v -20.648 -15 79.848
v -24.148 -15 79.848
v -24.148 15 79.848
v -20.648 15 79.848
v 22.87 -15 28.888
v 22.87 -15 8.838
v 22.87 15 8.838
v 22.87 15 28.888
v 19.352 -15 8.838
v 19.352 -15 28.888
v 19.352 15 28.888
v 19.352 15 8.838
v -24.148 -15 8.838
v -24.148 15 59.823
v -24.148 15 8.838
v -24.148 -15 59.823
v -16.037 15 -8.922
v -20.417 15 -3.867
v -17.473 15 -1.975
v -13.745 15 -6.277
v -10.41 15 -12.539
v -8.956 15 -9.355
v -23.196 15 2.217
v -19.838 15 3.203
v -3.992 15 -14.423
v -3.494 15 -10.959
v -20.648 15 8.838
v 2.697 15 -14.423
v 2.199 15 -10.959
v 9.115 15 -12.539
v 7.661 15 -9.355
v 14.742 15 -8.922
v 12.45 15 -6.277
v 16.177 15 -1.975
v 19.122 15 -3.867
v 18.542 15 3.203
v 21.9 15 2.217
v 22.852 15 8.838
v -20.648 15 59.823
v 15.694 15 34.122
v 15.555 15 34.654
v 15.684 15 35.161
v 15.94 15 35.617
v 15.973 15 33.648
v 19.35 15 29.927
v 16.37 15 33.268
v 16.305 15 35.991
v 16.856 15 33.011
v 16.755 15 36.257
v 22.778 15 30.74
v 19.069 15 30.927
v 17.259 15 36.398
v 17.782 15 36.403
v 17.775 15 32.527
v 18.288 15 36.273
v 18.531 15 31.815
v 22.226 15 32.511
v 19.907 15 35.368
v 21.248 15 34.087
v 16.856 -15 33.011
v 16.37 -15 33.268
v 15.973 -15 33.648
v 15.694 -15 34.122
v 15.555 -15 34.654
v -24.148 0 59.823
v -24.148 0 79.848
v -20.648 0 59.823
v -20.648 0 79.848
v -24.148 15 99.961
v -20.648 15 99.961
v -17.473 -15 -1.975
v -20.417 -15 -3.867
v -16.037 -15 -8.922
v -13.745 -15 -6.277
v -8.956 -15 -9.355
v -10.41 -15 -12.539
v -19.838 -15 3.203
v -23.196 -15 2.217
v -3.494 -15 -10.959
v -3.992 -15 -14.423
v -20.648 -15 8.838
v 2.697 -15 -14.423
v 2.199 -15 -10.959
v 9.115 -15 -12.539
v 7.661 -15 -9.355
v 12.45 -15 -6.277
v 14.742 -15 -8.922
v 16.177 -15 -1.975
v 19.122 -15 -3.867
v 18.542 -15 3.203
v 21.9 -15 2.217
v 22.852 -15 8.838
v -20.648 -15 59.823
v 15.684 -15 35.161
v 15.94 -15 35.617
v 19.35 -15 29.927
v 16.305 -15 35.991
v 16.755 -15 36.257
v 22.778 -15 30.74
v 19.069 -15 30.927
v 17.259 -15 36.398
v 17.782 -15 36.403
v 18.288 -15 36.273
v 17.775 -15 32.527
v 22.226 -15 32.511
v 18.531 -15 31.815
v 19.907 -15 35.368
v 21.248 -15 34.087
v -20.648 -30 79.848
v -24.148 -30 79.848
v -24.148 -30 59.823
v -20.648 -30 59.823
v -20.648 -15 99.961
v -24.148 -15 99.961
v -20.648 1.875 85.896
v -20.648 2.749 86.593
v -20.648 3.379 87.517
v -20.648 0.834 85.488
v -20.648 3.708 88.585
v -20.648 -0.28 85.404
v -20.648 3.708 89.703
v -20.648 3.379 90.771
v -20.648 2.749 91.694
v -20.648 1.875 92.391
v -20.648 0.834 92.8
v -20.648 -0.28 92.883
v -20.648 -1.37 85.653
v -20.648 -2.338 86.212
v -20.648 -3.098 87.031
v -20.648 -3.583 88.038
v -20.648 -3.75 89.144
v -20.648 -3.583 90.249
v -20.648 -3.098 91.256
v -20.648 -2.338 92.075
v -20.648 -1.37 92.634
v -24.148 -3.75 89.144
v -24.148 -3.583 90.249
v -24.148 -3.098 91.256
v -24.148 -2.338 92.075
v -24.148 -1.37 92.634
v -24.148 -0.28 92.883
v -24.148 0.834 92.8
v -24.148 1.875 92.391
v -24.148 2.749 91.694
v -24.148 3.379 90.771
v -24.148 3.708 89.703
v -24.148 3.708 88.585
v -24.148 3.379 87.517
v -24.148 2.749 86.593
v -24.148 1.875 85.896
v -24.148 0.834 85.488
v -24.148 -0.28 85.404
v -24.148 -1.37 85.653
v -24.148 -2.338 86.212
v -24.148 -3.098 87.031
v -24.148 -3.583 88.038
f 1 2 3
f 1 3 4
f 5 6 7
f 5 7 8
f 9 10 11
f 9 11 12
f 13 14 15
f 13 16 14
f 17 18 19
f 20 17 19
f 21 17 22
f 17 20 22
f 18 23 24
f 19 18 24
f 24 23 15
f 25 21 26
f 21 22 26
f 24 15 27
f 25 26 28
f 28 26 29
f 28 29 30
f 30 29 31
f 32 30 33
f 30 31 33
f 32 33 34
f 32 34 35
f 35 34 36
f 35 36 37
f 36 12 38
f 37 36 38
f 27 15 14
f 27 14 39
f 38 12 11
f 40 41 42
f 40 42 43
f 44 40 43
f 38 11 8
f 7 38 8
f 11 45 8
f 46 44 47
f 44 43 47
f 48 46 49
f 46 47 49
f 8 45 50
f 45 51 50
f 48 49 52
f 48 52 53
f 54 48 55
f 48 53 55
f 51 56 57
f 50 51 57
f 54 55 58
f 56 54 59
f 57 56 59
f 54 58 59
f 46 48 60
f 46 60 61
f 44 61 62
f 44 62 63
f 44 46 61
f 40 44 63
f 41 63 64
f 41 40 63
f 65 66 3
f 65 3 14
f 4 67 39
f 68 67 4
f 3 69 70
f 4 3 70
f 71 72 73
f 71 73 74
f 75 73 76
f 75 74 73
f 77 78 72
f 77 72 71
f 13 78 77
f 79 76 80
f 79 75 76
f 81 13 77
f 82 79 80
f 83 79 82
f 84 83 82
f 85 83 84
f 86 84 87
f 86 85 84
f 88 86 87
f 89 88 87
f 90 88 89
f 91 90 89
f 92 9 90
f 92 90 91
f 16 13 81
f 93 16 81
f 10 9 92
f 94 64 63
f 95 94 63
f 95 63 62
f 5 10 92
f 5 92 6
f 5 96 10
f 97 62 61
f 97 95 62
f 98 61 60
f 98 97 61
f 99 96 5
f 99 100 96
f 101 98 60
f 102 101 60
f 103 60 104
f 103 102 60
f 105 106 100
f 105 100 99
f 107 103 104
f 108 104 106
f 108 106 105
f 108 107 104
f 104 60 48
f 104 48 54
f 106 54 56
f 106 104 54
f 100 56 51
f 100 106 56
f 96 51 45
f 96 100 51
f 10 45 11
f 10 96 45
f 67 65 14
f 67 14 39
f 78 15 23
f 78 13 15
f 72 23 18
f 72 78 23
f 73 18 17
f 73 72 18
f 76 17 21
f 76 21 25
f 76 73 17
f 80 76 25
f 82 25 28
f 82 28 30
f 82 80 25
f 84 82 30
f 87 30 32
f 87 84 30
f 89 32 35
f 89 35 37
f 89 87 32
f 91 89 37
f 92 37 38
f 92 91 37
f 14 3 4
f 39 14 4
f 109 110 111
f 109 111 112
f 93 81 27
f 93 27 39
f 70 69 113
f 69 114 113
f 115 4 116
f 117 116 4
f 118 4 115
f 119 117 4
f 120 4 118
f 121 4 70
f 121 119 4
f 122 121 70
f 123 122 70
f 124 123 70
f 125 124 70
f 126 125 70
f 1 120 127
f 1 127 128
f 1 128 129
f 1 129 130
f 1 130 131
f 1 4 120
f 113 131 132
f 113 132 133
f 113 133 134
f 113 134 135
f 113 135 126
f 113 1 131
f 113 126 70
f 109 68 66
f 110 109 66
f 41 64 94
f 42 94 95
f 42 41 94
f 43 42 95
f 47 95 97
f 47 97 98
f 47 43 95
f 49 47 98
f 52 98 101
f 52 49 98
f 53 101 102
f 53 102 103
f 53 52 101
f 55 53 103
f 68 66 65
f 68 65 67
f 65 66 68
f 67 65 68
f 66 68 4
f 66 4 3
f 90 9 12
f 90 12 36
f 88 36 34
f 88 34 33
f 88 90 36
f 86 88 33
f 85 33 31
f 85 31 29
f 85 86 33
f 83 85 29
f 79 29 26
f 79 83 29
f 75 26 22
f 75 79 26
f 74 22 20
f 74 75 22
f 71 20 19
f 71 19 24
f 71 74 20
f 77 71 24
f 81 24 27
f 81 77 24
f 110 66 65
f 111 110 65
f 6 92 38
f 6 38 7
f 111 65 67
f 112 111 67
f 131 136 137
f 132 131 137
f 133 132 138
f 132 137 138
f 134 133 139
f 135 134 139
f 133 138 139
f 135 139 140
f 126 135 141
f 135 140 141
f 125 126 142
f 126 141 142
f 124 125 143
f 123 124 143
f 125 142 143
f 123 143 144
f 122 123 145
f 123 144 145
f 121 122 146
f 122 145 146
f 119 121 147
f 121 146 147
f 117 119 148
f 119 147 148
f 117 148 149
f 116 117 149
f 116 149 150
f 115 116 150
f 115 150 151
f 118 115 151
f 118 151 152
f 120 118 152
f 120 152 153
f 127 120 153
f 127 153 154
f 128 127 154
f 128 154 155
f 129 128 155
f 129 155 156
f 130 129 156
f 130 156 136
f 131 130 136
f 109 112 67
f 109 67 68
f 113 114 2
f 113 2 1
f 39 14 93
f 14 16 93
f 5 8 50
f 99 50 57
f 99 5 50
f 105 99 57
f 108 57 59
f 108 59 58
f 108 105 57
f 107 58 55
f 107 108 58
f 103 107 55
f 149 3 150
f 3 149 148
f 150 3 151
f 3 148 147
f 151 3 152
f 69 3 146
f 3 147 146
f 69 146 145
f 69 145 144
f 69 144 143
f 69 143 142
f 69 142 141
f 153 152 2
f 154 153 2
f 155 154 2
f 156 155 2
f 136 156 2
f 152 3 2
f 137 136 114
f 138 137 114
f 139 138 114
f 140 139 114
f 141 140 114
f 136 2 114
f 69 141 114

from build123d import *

# Parameters (mm, degrees)
F0_W        = 3.5
F0_H        = 20.1132470577
F1_DEPTH    = 15
F0_H_2      = 21.1232600108
F0_H_3      = 29.8616039545
F3_D        = 7.5
F4_T1_DEPTH = 38.2360477135
F4_T3_DEPTH = 43.9936648007
F5_DEPTH    = 30
F6_DEPTH    = 15


# Not quite as in the source:
# - a fillet or chamfer that OpenCascade refuses, or shapes differently, is made with other operations: its cross-section is extruded or revolved along the edge and cut away or added


with BuildPart() as f1:
    # F0 (on Front) → F1 (new body, symmetric)
    with BuildSketch(Plane.XZ):
        with Locations((-22.3977046013, 89.9042797192)):
            Rectangle(F0_W, F0_H)
    extrude(amount=F1_DEPTH, both=True)

    # F3 (through all)
    with Locations(Plane.YZ):
        with Locations((0, 89.1436196168)):
            Hole(F3_D / 2)


with BuildPart() as f1b:
    # F0 (on Front) → F1, piece 2 (new body, symmetric)
    with BuildSketch(Plane.XZ):
        with Locations((-22.3977046013, 19.3992732427)):
            Rectangle(F0_W, F0_H_2)
        with BuildLine():
            Line((-20.6477046013, 8.8376432372), (-24.1477046013, 8.8376432372))
            ThreePointArc((-24.1477046013, 8.8376432372), (-0.6477046013, -14.6623567628), (22.8522953987, 8.8376432372))
            Line((22.8522953987, 8.8376432372), (19.3522953987, 8.8376432372))
            ThreePointArc((19.3522953987, 8.8376432372), (-0.6477046013, -11.1623567628), (-20.6477046013, 8.8376432372))
        make_face()
        Polygon((19.3522953987, 8.8376432372), (22.8522953987, 8.8376432372), (22.8696210889, 8.8376432372), (22.8696210889, 28.8880299777), (19.3522953987, 28.8880299777), align=None)
        with BuildLine():
            ThreePointArc((15.540712513, 33.2429967821), (18.4344082452, 31.930153514), (19.3522953987, 28.8880299777))
            Line((19.3522953987, 28.8880299777), (22.8696210889, 28.8880299777))
            ThreePointArc((22.8696210889, 28.8880299777), (20.9352317559, 34.4482994471), (15.540712513, 36.8057601154))
            Line((15.540712513, 36.8057601154), (15.540712513, 33.2429967821))
        make_face()
        with Locations((-22.3977046013, 44.8917052254)):
            Rectangle(F0_W, F0_H_3)
    extrude(amount=F1_DEPTH, both=True)

    # F4: fillet of radius 2 on 2 edges, made by hand

    # F4_s2 → F4_t1 (cut)
    with BuildSketch(Plane.XZ.offset(-19.1180238568)):
        with BuildLine():
            ThreePointArc((16.8564234422, 33.0109116519), (15.9023324989, 33.7431618927), (15.540712513, 34.8902063248))
            Line((15.540712513, 34.8902063248), (15.540712513, 33.2429967821))
            ThreePointArc((15.540712513, 33.2429967821), (16.2087242563, 33.1845310505), (16.8564234422, 33.0109116519))
        make_face()
    extrude(amount=F4_T1_DEPTH, mode=Mode.SUBTRACT)

    # F4_s4 → F4_t3 (cut)
    with BuildSketch(Plane.XZ.offset(-21.9968324004)):
        with BuildLine():
            ThreePointArc((15.540712513, 34.4179292964), (16.4215839799, 36.0755032243), (18.2882638394, 36.2729675749))
            ThreePointArc((18.2882638394, 36.2729675749), (16.9400789931, 36.6713328153), (15.540712513, 36.8057601154))
            Line((15.540712513, 36.8057601154), (15.540712513, 34.4179292964))
        make_face()
    extrude(amount=F4_T3_DEPTH, mode=Mode.SUBTRACT)


with BuildPart() as f5:
    # F0 (on Front) → F5 (new body)
    with BuildSketch(Plane.XZ):
        Polygon((-20.6477046013, 79.8476561904), (-24.1477046013, 79.8476561904), (-24.1477046013, 59.8225072026), (-20.6477046013, 59.8225072026), (-20.6477046013, 65.9805735738), align=None)
    extrude(amount=F5_DEPTH)


with BuildPart() as f6:
    # F0 (on Front) → F6 (new body)
    with BuildSketch(Plane.XZ):
        Polygon((-20.6477046013, 79.8476561904), (-24.1477046013, 79.8476561904), (-24.1477046013, 59.8225072026), (-20.6477046013, 59.8225072026), (-20.6477046013, 65.9805735738), align=None)
    extrude(amount=-F6_DEPTH)


solid = Compound([f1.part, f1b.part, f5.part, f6.part])
